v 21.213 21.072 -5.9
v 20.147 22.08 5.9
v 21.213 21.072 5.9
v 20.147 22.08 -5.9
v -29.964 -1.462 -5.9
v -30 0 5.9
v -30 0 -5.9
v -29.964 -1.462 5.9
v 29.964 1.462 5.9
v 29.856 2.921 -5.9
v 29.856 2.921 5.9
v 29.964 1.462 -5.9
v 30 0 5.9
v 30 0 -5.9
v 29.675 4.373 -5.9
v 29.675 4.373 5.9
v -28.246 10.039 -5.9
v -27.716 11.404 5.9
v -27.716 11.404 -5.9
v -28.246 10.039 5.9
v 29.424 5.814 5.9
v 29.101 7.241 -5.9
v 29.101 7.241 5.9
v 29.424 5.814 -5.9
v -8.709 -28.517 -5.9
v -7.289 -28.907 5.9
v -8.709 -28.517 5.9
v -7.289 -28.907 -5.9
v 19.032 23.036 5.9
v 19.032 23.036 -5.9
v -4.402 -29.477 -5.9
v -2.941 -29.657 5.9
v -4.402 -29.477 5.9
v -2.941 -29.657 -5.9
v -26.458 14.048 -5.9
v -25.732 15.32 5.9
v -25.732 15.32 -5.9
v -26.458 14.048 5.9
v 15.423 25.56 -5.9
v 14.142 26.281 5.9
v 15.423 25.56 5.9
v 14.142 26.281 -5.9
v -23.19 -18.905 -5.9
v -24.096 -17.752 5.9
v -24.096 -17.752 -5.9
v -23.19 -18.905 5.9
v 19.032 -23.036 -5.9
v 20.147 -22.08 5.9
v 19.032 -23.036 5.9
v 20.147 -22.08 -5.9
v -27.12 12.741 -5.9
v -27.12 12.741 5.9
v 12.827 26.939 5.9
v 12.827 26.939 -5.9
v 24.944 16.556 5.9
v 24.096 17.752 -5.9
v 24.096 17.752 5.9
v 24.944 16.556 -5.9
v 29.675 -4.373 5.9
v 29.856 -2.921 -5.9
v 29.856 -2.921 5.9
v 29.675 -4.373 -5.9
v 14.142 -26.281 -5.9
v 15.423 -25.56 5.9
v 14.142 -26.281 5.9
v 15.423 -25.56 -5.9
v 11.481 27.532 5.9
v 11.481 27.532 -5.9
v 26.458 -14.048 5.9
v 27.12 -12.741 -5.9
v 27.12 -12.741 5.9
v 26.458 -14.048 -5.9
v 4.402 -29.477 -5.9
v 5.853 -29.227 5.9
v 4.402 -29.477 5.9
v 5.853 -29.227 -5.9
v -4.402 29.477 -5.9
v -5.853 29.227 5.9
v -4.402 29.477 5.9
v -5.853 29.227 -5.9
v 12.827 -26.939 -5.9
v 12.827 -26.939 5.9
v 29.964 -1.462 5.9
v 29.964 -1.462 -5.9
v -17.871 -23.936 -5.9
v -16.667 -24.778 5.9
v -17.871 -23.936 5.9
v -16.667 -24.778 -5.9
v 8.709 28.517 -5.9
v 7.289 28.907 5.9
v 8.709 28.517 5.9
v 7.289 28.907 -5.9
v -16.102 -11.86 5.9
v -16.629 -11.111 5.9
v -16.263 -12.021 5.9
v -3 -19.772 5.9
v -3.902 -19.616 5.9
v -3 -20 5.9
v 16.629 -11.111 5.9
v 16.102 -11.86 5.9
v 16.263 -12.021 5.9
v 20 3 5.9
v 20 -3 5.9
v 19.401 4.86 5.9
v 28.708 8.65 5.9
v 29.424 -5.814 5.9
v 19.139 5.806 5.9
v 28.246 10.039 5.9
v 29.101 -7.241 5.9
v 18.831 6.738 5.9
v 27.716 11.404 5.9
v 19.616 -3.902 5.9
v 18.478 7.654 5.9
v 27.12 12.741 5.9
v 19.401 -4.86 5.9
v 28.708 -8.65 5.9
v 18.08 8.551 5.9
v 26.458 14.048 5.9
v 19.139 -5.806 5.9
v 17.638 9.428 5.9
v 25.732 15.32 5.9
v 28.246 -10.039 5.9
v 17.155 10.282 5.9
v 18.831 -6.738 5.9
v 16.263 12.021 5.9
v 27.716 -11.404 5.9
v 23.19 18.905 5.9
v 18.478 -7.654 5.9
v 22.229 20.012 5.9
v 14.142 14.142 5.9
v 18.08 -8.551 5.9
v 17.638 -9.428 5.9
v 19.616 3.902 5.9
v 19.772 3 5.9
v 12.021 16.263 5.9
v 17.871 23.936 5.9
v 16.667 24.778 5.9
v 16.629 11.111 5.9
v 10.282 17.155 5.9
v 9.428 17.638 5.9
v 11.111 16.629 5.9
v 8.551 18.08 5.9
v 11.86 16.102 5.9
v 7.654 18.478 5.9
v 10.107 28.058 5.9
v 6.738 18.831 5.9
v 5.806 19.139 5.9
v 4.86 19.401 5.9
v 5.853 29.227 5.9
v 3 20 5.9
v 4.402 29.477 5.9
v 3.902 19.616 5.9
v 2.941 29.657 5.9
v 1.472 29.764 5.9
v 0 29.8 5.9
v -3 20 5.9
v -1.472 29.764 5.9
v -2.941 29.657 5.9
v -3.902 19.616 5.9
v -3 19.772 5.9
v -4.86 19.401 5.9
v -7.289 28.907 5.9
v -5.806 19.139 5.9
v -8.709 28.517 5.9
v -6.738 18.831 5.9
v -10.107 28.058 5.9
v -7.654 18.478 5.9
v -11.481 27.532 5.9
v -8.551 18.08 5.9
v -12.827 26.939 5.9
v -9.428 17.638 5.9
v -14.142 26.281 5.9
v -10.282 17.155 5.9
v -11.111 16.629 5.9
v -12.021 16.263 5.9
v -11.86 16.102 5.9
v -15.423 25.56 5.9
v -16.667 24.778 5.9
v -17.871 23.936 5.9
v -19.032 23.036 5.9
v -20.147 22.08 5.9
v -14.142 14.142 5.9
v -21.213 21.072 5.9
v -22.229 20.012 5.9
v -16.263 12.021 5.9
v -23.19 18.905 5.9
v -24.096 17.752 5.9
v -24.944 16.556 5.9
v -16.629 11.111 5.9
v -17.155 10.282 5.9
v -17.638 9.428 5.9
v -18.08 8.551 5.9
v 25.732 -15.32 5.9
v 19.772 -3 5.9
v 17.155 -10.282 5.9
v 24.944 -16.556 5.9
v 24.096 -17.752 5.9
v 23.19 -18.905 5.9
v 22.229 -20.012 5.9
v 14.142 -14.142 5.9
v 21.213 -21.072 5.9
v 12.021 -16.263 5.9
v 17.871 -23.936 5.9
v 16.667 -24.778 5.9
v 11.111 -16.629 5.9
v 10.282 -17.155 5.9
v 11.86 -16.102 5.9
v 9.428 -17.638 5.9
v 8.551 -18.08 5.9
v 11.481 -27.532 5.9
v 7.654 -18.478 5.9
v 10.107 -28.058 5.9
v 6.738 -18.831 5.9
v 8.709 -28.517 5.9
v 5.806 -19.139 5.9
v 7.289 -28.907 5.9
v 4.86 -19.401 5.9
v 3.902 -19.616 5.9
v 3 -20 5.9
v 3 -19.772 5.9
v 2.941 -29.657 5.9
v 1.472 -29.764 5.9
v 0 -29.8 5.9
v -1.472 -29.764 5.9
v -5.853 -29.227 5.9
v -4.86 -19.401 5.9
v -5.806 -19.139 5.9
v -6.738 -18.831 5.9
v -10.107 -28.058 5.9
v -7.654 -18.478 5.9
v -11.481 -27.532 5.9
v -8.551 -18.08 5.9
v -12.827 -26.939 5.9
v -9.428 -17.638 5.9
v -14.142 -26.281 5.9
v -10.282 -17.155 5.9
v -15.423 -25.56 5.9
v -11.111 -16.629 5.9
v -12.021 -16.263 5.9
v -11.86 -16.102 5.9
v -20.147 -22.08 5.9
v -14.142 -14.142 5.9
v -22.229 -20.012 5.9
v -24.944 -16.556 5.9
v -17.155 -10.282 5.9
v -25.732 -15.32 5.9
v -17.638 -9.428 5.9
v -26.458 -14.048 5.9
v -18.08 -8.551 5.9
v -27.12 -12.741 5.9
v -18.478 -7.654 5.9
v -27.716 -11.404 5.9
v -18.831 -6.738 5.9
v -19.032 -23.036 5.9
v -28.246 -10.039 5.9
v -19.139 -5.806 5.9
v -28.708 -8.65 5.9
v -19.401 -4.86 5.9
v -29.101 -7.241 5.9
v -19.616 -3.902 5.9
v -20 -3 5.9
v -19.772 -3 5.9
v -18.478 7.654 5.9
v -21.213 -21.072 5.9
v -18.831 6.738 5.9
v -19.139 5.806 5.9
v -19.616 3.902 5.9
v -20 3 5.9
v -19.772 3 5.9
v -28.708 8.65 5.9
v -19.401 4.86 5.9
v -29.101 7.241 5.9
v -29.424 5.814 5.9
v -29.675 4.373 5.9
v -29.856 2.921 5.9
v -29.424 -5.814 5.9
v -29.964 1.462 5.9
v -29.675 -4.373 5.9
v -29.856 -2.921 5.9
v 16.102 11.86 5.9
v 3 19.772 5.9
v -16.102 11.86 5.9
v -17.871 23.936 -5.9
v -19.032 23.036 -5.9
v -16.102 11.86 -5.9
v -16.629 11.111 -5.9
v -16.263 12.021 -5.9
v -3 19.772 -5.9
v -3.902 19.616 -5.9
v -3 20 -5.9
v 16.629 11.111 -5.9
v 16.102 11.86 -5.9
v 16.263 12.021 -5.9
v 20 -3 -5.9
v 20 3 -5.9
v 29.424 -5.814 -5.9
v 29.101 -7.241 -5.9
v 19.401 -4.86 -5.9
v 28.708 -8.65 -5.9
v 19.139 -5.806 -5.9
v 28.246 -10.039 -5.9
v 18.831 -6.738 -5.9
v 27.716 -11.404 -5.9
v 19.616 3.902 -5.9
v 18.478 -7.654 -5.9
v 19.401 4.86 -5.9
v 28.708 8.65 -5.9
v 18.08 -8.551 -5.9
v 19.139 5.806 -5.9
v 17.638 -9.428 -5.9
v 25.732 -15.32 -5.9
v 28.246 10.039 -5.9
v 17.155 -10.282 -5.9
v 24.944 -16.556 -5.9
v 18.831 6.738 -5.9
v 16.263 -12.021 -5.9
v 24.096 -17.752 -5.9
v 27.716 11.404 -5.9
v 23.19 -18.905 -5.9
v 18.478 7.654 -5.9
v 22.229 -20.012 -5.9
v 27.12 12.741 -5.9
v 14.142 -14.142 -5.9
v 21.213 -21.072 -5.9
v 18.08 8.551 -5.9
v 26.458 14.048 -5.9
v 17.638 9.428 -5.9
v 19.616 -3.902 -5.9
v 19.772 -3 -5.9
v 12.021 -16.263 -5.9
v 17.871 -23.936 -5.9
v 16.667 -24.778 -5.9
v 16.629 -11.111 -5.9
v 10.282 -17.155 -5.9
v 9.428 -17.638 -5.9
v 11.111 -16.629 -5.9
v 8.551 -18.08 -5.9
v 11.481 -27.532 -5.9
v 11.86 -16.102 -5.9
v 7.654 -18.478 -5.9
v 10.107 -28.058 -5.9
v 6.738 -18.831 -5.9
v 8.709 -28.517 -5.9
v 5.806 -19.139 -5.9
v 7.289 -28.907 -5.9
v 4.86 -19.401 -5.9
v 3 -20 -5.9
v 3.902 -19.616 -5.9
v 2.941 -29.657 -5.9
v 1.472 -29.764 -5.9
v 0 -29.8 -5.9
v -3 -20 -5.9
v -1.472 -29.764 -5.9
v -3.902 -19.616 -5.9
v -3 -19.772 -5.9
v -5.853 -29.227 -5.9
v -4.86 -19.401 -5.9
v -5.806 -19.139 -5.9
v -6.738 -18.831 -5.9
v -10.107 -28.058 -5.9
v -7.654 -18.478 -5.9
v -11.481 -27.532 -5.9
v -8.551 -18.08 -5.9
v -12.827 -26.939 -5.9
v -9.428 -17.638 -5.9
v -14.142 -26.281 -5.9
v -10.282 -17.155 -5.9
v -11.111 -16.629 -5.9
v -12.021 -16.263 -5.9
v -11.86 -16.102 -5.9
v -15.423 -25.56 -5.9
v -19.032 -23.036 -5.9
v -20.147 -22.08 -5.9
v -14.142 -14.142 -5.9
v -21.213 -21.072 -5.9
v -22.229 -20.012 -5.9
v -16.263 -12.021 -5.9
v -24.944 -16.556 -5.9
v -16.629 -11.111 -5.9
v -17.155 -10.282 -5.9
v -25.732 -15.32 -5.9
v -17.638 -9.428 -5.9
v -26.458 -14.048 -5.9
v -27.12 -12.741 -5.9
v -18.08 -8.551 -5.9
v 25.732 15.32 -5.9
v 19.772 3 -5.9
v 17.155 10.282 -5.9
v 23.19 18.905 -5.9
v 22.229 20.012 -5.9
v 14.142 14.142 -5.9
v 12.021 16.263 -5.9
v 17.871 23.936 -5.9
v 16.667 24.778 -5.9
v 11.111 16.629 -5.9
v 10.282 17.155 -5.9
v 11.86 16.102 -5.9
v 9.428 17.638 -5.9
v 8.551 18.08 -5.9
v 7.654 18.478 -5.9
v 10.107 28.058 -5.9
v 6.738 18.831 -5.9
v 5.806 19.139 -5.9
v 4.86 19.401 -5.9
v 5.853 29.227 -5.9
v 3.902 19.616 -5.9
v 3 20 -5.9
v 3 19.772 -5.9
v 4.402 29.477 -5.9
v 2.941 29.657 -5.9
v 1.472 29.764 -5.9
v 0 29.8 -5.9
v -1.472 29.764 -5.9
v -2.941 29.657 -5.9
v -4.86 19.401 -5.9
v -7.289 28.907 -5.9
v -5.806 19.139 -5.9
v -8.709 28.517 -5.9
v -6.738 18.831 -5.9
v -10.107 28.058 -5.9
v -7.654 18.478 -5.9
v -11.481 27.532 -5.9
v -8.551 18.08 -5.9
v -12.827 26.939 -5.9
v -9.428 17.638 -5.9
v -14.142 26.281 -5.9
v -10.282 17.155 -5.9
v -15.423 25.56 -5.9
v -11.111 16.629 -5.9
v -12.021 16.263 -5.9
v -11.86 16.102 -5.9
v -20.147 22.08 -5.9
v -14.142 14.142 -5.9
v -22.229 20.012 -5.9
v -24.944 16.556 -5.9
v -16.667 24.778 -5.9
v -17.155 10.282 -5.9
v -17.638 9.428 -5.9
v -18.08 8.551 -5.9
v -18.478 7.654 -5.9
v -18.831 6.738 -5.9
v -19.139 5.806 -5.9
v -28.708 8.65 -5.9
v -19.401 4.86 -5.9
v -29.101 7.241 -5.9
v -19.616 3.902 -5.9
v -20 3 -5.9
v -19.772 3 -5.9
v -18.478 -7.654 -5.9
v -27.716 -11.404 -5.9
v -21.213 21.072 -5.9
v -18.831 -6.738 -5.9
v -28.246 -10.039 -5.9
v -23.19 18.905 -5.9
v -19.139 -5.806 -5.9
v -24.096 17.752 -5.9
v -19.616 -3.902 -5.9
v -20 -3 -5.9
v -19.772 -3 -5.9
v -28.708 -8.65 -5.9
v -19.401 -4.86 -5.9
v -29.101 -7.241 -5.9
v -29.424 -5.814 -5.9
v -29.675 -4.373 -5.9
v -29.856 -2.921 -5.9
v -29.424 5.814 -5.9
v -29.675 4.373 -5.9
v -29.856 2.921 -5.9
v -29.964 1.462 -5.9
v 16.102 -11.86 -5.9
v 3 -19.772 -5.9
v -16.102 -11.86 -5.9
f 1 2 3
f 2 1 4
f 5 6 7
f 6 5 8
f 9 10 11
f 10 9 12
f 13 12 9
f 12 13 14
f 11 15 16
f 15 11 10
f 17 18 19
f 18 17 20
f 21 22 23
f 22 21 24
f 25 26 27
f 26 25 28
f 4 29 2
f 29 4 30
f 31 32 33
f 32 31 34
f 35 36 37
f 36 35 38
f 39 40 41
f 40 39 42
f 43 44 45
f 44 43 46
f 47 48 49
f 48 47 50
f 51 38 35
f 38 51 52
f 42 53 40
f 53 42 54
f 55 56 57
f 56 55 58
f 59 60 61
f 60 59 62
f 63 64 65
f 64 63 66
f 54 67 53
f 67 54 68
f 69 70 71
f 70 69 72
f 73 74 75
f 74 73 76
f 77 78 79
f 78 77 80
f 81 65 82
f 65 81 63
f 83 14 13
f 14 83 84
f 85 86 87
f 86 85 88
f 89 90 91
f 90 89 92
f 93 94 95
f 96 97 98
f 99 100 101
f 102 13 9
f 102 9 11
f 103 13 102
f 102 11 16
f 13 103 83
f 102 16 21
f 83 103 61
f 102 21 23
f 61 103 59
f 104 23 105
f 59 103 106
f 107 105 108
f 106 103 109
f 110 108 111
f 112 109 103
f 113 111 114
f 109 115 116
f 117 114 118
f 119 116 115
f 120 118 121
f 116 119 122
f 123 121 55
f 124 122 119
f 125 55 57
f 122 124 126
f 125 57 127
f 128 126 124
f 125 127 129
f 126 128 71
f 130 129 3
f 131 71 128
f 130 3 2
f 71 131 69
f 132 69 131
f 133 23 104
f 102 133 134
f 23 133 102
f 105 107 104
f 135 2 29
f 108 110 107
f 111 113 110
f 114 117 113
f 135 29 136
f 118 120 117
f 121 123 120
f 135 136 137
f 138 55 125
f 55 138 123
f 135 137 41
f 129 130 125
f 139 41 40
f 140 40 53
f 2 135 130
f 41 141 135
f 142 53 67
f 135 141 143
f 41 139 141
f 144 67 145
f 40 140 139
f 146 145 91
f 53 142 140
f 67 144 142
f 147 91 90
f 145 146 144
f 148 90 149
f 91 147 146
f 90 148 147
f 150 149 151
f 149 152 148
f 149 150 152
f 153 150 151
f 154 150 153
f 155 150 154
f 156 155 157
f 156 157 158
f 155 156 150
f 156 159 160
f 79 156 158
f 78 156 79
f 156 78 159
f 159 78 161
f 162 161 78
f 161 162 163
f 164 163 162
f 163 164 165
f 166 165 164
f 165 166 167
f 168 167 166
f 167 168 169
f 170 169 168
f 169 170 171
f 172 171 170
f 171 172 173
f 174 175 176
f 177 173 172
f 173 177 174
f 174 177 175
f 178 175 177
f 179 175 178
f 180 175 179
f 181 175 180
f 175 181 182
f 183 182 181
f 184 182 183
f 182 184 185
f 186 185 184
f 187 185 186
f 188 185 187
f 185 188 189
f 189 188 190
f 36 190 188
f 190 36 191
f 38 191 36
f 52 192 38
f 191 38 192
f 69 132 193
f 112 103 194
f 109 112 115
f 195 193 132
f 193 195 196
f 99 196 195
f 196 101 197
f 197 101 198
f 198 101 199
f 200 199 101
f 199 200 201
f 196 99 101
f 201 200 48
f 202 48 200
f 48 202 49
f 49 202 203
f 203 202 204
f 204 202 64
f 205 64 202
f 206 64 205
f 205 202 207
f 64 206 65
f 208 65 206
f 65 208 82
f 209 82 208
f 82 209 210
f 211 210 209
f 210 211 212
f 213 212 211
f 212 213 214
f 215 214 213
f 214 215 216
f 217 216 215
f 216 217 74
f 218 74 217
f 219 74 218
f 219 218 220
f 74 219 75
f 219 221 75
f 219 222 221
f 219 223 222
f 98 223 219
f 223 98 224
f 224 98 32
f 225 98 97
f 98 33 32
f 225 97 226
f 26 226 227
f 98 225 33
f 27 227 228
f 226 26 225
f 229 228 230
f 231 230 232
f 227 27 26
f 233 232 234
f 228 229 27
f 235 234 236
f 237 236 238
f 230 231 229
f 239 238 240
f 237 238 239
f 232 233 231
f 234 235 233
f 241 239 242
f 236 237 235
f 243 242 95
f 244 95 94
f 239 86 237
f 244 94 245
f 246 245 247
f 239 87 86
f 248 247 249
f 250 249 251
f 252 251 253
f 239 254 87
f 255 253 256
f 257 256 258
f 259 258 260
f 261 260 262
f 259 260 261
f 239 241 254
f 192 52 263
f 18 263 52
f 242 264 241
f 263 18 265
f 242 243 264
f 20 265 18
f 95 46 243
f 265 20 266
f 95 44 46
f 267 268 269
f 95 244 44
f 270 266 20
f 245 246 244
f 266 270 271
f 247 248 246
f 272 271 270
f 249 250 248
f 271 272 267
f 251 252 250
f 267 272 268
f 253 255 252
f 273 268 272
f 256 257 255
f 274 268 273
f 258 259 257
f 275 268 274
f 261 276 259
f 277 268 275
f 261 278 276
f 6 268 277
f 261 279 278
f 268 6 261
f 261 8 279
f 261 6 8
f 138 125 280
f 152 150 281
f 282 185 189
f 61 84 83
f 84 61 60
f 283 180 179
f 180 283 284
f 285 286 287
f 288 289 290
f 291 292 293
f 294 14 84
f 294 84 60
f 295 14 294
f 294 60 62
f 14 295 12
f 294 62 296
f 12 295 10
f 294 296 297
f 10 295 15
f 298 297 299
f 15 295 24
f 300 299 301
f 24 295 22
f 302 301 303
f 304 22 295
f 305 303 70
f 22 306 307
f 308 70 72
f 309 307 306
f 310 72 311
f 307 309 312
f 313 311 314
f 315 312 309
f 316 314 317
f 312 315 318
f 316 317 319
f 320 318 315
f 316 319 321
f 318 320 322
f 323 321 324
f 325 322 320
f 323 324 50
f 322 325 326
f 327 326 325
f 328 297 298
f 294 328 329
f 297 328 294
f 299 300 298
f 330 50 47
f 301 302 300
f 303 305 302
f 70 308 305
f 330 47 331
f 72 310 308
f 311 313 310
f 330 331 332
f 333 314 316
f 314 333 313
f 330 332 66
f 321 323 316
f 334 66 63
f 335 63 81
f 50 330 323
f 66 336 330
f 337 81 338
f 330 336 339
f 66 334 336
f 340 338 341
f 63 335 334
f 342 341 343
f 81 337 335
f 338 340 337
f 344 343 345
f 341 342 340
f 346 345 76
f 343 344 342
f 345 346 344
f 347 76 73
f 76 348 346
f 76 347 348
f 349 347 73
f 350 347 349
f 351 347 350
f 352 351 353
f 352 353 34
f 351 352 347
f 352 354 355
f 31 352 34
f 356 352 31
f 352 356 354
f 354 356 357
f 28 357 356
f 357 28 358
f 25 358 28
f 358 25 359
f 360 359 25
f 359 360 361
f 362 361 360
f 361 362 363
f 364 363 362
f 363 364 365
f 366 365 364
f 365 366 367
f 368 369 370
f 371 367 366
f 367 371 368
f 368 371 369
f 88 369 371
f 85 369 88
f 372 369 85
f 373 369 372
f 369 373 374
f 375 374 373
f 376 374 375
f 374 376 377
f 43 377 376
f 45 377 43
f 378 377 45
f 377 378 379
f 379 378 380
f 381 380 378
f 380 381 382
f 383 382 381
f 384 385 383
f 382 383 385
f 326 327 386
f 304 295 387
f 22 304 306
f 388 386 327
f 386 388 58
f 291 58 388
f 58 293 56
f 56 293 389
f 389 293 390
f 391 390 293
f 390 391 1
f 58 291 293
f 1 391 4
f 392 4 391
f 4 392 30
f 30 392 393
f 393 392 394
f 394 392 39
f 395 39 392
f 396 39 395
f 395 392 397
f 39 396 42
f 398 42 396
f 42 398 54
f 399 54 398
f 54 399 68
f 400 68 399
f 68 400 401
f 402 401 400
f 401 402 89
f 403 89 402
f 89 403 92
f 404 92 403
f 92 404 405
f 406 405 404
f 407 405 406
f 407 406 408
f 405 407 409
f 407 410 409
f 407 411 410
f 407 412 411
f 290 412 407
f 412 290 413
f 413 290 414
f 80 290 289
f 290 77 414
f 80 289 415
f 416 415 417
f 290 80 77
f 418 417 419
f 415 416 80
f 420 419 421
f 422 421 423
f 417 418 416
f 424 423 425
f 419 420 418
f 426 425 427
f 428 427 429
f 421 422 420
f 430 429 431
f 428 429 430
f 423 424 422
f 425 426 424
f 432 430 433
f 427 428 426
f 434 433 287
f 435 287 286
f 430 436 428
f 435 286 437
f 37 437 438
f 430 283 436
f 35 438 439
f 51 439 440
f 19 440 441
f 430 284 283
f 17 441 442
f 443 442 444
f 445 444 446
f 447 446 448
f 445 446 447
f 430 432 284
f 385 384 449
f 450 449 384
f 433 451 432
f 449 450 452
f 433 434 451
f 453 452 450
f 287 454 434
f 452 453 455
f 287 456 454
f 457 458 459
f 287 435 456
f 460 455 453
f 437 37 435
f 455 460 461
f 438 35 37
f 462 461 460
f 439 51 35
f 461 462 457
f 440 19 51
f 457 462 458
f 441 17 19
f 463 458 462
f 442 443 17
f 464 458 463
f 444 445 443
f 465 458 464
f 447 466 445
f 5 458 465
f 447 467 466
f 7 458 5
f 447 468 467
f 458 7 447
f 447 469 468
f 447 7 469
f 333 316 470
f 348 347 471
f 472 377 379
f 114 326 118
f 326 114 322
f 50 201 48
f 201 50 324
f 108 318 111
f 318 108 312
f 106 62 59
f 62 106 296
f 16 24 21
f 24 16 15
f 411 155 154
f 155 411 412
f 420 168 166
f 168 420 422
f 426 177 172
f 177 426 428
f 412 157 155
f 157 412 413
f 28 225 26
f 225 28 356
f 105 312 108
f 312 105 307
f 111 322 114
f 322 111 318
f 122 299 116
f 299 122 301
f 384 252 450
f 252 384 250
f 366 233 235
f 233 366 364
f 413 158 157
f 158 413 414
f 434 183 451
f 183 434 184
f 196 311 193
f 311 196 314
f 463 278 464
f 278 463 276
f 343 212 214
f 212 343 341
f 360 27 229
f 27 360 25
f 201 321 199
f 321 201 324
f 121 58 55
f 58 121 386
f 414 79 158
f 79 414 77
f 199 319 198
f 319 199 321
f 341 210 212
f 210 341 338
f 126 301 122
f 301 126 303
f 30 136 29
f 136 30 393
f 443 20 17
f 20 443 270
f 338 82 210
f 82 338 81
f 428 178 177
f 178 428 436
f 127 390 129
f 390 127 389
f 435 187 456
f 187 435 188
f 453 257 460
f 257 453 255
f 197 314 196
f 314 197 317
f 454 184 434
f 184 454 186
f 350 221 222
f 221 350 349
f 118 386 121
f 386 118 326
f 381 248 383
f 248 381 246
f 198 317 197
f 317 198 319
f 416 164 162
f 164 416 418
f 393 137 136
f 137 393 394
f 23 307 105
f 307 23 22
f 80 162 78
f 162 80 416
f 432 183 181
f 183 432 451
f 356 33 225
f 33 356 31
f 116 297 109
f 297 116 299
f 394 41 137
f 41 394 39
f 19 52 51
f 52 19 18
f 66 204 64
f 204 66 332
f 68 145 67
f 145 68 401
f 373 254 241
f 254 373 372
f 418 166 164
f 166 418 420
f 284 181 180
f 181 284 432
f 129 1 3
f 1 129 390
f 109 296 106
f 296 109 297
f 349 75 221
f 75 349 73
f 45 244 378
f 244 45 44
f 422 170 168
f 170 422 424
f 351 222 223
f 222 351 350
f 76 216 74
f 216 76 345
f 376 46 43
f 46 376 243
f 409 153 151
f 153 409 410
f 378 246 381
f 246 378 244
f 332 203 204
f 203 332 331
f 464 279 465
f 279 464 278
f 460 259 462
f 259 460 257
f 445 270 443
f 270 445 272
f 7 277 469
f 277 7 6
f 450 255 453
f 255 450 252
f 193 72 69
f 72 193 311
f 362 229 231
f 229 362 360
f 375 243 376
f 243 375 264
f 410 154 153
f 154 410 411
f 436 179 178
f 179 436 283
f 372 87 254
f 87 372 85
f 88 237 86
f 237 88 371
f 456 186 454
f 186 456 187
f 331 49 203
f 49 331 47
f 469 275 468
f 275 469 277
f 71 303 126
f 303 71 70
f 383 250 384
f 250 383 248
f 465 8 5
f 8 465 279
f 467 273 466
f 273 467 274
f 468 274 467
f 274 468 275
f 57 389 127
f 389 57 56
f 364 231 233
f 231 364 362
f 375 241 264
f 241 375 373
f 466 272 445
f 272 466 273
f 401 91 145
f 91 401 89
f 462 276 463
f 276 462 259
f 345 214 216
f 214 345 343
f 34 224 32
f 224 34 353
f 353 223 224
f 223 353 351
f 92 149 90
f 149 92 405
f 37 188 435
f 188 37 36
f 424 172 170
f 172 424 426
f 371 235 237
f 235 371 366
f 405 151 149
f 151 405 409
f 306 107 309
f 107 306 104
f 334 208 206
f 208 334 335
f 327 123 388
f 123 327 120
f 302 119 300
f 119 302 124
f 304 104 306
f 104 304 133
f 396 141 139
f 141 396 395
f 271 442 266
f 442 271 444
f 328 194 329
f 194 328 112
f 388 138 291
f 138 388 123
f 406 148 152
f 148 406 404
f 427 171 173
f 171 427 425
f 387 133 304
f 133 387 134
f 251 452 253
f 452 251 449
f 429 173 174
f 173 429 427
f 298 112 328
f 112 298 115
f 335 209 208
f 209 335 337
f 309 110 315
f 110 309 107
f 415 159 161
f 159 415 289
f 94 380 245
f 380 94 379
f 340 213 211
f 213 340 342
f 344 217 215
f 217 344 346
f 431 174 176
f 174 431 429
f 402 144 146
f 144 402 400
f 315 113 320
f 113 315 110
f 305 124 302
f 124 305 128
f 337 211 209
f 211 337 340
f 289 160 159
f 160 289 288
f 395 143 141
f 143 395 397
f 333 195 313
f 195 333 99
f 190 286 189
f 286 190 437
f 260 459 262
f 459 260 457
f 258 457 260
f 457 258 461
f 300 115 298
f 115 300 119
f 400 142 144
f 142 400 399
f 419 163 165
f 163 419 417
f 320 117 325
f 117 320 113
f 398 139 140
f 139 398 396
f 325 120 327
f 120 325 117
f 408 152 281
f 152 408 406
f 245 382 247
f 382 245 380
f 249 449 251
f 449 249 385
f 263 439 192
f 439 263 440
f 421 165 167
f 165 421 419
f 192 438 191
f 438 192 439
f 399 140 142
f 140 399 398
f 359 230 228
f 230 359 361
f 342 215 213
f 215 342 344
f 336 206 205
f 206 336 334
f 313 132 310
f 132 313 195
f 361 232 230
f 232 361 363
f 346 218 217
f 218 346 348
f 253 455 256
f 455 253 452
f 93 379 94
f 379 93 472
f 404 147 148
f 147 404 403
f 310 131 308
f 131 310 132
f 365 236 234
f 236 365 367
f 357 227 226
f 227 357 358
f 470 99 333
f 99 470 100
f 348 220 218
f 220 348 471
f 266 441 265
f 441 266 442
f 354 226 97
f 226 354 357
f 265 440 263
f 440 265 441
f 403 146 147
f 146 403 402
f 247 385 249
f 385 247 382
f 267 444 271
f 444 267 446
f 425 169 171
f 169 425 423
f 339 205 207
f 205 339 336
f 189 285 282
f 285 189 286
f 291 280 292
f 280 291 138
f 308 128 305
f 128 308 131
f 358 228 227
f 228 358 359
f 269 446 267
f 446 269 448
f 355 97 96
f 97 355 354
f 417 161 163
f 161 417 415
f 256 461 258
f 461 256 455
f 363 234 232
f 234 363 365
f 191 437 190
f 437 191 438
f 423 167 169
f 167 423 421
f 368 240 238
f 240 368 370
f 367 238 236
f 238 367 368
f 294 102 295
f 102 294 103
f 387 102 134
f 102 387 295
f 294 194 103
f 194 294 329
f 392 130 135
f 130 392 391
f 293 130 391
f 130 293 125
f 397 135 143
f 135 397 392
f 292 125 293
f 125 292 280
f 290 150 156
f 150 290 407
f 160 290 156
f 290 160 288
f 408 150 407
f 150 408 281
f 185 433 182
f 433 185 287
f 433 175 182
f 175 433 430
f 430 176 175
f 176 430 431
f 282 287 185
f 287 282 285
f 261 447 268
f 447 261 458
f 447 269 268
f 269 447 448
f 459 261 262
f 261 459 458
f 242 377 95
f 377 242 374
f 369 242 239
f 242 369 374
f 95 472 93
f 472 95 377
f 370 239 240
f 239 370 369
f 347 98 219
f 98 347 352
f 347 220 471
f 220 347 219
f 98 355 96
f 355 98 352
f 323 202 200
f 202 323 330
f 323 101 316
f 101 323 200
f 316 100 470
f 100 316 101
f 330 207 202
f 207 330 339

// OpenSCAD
$fn=128;

outer_d = 60.0;
outer_d_y = 59.6;
thickness = 11.8;

inner_d = 40.0;

notch_count = 8;
notch_depth = 4.0;
notch_width = 6.0;

module ring_body() {
    difference() {
        scale([1, outer_d_y/outer_d, 1])
            cylinder(d=outer_d, h=thickness, center=true);
        cylinder(d=inner_d, h=thickness+0.4, center=true);
    }
}

module inner_notch(angle_deg) {
    rotate([0,0,angle_deg])
        translate([inner_d/2 - notch_depth/2, 0, 0])
            cube([notch_depth, notch_width, thickness+0.6], center=true);
}

difference() {
    ring_body();
    for (i = [0:notch_count-1]) {
        inner_notch(i*360/notch_count);
    }
}
